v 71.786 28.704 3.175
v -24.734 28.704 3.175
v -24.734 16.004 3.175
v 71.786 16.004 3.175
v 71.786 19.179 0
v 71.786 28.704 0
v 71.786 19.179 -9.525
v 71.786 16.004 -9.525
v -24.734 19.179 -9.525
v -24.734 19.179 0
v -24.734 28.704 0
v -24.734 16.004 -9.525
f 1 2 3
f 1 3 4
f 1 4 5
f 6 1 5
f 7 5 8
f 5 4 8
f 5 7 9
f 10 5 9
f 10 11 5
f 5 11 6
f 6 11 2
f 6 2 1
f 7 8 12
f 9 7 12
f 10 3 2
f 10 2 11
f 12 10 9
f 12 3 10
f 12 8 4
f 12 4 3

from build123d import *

# Parameters (mm, degrees)
SKETCH1_W           = 96.52
SKETCH1_H           = 12.7
BOSS_EXTRUDE1_DEPTH = 3.175
SKETCH7_W           = 96.52
SKETCH7_H           = 9.525
BOSS_EXTRUDE2_DEPTH = 3.175


with BuildPart() as part:
    # Sketch1 → Boss-Extrude1 (new body)
    with BuildSketch(Plane.XY):
        with Locations((23.526472643, 22.354273404)):
            Rectangle(SKETCH1_W, SKETCH1_H)
    extrude(amount=BOSS_EXTRUDE1_DEPTH)

    # Sketch7 → Boss-Extrude2 (add)
    with BuildSketch(Plane(origin=(0, 16.004273404, 0), x_dir=(-1, 0, 0), z_dir=(0, -1, 0))):
        with Locations((-23.526472643, 4.7625)):
            Rectangle(SKETCH7_W, SKETCH7_H)
    extrude(amount=-BOSS_EXTRUDE2_DEPTH)


solid = part.part
